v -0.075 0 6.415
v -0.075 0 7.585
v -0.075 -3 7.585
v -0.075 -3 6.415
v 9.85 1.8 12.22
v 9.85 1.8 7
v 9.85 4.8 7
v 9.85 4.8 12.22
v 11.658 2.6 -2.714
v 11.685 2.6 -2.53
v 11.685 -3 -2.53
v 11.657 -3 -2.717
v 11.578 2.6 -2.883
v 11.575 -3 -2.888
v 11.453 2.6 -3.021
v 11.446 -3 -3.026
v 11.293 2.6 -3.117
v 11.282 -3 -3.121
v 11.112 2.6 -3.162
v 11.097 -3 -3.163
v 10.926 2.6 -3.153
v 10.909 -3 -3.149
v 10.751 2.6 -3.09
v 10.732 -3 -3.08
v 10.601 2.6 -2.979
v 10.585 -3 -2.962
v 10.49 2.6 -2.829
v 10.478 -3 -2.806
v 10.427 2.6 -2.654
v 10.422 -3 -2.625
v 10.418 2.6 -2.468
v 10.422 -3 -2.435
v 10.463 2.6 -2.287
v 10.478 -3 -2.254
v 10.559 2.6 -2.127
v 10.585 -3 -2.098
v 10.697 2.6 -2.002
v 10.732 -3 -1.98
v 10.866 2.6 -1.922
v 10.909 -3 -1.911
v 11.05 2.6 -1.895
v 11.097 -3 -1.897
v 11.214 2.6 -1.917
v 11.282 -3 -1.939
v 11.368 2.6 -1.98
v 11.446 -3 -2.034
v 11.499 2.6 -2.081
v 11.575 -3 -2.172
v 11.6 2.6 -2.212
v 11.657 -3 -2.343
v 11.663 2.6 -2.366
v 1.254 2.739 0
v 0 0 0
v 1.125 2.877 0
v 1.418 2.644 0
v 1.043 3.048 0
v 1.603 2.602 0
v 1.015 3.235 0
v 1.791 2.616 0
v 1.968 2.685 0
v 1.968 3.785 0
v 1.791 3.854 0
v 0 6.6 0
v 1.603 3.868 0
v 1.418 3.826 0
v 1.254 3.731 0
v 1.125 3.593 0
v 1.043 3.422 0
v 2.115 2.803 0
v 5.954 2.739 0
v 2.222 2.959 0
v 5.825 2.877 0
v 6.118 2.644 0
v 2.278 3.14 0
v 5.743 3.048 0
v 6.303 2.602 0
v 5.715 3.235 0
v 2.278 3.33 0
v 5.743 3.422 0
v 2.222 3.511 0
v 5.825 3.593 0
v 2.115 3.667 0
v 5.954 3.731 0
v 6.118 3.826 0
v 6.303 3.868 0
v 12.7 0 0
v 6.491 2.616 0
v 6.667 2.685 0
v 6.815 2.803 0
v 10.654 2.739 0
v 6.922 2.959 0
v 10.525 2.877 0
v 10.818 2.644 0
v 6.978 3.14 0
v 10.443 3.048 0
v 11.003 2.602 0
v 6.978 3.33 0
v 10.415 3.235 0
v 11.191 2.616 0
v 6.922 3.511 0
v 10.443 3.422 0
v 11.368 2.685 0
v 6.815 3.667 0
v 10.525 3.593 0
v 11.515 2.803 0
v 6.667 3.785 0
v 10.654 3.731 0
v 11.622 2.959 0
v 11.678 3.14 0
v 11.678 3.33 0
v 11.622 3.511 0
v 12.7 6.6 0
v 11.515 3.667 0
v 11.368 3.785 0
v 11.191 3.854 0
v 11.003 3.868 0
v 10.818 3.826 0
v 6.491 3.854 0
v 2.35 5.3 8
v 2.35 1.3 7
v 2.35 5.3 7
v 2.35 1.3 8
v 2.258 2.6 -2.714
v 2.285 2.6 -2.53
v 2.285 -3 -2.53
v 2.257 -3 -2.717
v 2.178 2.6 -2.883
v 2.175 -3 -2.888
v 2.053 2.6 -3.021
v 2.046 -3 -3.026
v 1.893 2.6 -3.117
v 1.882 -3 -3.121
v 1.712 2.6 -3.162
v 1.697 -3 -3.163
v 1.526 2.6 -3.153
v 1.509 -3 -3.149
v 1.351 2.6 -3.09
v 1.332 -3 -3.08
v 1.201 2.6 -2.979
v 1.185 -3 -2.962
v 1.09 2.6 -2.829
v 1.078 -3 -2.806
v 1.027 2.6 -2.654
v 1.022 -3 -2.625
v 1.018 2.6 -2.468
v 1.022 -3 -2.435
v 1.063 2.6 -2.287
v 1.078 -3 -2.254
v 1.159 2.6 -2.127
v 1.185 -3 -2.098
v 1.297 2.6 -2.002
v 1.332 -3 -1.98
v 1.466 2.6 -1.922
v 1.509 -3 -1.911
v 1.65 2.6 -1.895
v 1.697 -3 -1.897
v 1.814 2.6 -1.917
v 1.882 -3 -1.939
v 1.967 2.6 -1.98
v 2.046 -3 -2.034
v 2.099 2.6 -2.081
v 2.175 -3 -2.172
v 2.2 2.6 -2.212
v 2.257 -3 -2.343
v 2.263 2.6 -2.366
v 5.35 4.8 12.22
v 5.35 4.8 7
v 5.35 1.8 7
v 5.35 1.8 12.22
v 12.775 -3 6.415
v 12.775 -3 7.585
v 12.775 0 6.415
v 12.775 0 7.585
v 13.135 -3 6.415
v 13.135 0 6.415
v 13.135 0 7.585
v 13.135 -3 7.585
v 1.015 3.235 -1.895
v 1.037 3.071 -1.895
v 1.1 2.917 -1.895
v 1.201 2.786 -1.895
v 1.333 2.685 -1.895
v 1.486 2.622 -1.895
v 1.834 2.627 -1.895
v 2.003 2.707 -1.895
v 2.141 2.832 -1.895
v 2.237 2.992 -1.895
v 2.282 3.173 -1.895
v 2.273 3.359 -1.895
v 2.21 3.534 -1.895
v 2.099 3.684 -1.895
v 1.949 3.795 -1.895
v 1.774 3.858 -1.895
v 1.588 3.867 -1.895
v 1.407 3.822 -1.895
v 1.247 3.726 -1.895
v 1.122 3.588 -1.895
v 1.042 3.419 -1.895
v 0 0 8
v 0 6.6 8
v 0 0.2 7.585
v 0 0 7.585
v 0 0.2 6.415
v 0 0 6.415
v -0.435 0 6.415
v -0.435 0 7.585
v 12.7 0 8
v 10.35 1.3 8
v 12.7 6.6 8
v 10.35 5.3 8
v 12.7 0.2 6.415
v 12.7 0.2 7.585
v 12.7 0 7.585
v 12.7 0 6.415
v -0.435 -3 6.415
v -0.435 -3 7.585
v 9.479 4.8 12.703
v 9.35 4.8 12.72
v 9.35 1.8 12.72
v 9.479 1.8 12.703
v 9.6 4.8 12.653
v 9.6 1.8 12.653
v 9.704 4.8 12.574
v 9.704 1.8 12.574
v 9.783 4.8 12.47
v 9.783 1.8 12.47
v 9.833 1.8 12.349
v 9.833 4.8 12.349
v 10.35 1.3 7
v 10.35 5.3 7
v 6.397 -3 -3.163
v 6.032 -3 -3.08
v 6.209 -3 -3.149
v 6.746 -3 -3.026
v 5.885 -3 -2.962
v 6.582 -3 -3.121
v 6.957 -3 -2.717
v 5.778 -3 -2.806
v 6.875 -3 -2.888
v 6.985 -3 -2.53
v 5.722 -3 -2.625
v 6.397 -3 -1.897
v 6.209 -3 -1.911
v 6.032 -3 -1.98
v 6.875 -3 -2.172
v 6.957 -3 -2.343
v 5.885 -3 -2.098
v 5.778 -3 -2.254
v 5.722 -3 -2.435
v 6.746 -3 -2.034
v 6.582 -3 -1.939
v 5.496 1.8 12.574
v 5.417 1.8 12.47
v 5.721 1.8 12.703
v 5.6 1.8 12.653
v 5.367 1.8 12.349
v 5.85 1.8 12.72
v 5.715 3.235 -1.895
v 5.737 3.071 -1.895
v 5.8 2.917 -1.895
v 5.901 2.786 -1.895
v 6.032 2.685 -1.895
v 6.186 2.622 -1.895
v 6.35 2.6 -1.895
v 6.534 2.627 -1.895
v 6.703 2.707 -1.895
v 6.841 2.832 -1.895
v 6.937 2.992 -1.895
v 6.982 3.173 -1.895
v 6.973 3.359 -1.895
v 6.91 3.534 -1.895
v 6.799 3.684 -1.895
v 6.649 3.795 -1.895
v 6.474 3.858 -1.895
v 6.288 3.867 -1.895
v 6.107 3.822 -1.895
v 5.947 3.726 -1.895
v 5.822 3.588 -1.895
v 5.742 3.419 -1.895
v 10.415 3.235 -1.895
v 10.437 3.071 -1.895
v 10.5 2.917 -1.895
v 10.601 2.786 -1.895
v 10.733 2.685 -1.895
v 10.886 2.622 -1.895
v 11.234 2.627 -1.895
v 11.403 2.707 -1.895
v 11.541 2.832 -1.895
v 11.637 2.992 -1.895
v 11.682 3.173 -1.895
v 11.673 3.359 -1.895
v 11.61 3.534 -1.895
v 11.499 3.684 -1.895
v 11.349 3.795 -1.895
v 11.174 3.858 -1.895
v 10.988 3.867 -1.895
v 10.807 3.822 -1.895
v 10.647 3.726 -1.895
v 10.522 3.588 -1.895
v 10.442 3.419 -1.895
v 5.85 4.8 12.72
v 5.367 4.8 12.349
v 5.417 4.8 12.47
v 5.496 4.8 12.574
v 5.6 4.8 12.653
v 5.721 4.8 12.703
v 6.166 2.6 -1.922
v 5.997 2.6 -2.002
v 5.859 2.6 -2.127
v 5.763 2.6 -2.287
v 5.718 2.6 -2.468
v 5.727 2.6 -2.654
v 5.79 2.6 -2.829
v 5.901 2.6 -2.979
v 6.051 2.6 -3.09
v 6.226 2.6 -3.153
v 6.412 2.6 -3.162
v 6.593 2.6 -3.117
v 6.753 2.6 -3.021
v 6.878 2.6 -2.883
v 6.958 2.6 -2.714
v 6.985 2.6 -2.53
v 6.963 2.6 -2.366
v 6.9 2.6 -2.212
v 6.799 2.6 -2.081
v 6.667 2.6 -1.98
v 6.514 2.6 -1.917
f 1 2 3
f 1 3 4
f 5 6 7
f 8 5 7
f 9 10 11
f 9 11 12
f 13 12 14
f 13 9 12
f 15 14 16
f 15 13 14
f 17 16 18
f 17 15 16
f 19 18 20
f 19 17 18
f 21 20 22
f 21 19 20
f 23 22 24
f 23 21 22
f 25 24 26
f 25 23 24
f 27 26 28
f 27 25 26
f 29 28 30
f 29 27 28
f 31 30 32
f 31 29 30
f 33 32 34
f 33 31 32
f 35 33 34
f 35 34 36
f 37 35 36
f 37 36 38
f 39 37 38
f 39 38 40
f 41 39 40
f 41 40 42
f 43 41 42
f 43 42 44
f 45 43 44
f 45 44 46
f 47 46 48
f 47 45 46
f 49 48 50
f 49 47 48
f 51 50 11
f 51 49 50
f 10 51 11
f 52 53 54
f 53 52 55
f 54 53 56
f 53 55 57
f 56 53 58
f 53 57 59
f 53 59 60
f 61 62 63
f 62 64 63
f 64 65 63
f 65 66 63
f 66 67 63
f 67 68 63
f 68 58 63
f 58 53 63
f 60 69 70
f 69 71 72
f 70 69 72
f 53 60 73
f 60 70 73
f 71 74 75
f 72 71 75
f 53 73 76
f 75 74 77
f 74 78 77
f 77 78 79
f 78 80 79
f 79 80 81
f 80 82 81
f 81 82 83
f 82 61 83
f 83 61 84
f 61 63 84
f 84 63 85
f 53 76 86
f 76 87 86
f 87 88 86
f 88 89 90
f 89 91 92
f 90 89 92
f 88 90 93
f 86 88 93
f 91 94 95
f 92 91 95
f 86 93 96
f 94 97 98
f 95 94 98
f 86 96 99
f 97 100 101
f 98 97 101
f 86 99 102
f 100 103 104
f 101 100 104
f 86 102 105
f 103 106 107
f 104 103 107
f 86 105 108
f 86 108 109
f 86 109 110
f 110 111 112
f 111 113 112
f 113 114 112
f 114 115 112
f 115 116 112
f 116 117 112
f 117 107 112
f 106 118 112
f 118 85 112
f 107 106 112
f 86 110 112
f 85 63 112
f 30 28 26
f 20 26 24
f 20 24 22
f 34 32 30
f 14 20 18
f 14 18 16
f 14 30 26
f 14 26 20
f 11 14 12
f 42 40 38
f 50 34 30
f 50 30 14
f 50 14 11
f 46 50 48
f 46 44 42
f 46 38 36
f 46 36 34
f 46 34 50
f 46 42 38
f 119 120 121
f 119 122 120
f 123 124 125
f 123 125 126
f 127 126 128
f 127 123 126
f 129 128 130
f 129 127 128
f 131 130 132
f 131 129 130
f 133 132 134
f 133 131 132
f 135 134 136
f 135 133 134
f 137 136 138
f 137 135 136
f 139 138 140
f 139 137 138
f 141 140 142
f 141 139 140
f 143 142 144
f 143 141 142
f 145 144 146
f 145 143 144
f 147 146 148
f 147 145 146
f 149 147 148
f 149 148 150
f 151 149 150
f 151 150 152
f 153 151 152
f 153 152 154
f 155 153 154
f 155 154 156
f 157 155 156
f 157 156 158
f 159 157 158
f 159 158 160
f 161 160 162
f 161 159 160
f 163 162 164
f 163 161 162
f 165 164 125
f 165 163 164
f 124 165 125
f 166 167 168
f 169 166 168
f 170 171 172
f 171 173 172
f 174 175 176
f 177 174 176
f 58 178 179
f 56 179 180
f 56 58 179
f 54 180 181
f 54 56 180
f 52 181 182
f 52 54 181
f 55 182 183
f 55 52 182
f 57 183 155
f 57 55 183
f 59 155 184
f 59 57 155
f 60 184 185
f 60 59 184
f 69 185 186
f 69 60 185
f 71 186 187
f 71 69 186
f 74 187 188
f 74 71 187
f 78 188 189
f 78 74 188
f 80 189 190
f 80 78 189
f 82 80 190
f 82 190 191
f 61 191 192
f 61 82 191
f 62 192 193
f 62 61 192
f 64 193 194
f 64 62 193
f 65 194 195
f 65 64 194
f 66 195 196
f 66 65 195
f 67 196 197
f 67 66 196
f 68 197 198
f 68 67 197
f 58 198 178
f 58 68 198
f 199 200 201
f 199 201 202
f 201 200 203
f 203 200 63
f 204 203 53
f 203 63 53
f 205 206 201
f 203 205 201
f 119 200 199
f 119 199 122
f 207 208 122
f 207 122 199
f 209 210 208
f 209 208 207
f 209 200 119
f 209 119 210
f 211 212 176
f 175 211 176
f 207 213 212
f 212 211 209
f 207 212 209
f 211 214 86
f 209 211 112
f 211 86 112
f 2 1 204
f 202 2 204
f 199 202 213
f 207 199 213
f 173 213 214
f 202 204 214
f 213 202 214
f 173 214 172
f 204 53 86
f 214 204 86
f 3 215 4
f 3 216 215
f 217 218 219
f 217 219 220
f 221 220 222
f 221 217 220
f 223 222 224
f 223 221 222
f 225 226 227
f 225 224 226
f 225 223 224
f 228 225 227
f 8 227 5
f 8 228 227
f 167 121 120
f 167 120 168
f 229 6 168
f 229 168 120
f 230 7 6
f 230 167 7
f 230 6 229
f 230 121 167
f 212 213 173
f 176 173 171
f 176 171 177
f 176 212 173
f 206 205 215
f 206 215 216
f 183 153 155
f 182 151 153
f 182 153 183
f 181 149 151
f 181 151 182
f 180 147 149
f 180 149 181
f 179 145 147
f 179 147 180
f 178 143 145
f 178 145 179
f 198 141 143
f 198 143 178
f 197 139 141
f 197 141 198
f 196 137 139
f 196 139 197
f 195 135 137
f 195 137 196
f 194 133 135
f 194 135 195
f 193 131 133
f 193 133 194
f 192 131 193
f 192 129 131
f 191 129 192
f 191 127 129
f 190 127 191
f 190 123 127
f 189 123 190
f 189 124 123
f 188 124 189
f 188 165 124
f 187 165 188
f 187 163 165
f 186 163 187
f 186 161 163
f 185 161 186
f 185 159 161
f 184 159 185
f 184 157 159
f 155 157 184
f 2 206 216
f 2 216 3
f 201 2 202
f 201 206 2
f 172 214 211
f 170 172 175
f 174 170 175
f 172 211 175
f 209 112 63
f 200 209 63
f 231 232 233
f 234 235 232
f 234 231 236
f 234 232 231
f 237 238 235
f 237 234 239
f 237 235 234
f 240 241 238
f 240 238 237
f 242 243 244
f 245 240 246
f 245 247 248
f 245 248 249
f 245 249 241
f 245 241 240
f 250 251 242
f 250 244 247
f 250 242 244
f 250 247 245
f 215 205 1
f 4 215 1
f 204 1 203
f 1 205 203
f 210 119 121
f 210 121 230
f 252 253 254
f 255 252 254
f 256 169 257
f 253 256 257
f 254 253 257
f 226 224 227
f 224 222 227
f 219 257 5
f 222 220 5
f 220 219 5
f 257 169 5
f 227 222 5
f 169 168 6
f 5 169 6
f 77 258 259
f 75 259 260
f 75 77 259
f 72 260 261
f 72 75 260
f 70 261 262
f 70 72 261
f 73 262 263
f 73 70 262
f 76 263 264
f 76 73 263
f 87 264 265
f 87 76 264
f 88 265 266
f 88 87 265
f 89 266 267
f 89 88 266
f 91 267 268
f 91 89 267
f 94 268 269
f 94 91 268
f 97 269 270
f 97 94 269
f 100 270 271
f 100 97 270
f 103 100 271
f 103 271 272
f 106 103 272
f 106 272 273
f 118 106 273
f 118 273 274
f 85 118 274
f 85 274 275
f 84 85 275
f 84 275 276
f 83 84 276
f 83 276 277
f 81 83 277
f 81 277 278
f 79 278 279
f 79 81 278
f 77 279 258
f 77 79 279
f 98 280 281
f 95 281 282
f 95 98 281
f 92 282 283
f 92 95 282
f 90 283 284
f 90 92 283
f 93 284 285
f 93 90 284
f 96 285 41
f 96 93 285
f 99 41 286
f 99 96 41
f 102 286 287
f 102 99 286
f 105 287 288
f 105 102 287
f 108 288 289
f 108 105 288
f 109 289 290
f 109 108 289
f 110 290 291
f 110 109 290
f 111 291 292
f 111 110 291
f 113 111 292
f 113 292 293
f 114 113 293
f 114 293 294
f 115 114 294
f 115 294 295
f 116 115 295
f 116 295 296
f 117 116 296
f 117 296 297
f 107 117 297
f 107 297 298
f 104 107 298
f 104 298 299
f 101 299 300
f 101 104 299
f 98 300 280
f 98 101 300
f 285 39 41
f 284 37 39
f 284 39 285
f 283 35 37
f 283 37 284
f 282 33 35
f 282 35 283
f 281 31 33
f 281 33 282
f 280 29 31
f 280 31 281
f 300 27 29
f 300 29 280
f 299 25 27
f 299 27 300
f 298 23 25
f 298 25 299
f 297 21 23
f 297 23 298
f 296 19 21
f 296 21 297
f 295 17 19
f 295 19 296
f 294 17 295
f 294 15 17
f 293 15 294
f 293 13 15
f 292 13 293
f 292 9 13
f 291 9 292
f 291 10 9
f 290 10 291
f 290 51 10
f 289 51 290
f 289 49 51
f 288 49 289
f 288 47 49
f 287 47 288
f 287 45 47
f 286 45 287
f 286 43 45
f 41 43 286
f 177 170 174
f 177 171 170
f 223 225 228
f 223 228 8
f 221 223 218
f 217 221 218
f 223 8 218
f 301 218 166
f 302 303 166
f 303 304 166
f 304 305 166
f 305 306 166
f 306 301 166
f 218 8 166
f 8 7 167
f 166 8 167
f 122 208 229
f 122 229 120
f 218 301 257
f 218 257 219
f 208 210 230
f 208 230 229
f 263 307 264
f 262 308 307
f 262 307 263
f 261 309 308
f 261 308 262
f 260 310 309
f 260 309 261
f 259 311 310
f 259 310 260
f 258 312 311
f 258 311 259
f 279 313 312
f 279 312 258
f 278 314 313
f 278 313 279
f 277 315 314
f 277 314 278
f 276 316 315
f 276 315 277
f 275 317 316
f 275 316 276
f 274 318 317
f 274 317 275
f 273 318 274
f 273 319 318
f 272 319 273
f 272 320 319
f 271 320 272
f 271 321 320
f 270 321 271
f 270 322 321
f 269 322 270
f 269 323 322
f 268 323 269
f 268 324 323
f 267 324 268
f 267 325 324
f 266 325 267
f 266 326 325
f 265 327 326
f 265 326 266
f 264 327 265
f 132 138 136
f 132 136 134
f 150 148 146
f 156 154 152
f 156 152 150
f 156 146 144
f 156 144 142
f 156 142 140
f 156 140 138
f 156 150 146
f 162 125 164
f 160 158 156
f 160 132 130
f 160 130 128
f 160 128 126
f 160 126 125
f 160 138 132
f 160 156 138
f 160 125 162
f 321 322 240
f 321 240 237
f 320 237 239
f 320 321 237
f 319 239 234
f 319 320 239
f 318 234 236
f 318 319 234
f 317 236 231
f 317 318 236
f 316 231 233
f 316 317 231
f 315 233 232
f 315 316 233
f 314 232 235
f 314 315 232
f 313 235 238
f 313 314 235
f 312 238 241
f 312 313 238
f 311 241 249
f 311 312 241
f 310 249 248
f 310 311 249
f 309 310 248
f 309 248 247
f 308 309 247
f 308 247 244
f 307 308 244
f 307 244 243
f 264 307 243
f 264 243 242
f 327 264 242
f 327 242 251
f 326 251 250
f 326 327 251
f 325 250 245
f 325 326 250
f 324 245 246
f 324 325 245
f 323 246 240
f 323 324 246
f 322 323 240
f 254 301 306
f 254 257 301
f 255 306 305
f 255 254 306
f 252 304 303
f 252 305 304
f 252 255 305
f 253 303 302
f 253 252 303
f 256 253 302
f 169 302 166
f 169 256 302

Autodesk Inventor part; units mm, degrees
ref_plane "YZ Plane" through (0, 0, 0) normal (1, 0, 0) x (0, 1, 0)
sketch "Sketch1" plane through (0, 0, 0) normal (0, 0, 1) x (1, 0, 0)
  line L0 (0, 0) -> (12.7, 0)
  line L1 (12.7, 0) -> (12.7, 6.6)
  line L2 (12.7, 6.6) -> (0, 6.6)
  line L3 (0, 6.6) -> (0, 0)
  dimension "d0" = 12.7
  dimension "d1" = 6.6
extrude "Extrusion1" add sketch "Sketch1" along normal blind 8
sketch "Sketch2" plane through (0, 0, 0) normal (0, -1, 0) x (1, 0, 0)
  line L0 (0, 0) -> (12.7, 0) construction
  line L1 (12.7, 0) -> (12.7, 8) construction
  line L2 (0, 8) -> (12.7, 8) construction
  line L3 (0, 0) -> (0, 8) construction
  line L4 (0, 0) -> (12.7, 0) construction
  line L5 (6.35, 0) -> (6.35, 8) construction
  line L6 (0, 8) -> (12.7, 8) construction
  line L7 (13.135, 7.585) -> (12.775, 7.585)
  line L8 (12.775, 7.585) -> (12.775, 6.415)
  line L9 (12.775, 6.415) -> (13.135, 6.415)
  line L10 (13.135, 6.415) -> (13.135, 7.585)
  line L11 (13.135, 7.585) -> (12.775, 6.415) construction
  line L12 (12.775, 7.585) -> (13.135, 6.415) construction
  circle A0 centre (6.35, -2.53) radius 0.635
  circle A1 centre (11.05, -2.53) radius 0.635
  circle A2 centre (1.65, -2.53) radius 0.635
  line L13 (11.05, -2.53) -> (6.35, -2.53) construction
  line L14 (6.35, -2.53) -> (1.65, -2.53) construction
  line L15 (-0.435, 7.585) -> (-0.075, 7.585)
  line L16 (-0.075, 7.585) -> (-0.075, 6.415)
  line L17 (-0.075, 6.415) -> (-0.435, 6.415)
  line L18 (-0.435, 6.415) -> (-0.435, 7.585)
  point P0 (12.955, 7)
  dimension "d4" = 1.17
  dimension "d5" = 0.36
  dimension "d6" = 6.605
  dimension "d7" = 1.27
  dimension "d8" = 1.27
  dimension "d9" = 1.27
  dimension "d10" = 9.53
  dimension "d11" = 4.7
  dimension "d12" = 4.7
  dimension "d13" = 1
extrude "Extrusion2" add sketch "Sketch2" along normal blind 3
ref_plane "Work Plane1" through (0, 2.6, 0) normal (0, 1, 0) x (1, 0, 0)
sketch "Sketch3" plane through (11.05, 0, -2.53) normal (0, 1, 0) x (1, 0, 0)
  circle A0 centre (0, 0) radius 0.635 projected
  circle A1 centre (-4.7, 0) radius 0.635 projected
  circle A2 centre (-9.4, 0) radius 0.635 projected
  point P0 (-11.05, -2.53)
extrude "Extrusion3" add sketch "Sketch3" along normal up to surface (2.6 mm away)
sketch "Sketch4" plane through (0, 0, 0) normal (0, 0, -1) x (-1, 0, 0)
  line L0 (-6.985, 2.6) -> (-5.715, 2.6) projected
  line L1 (-6.35, 2.6) -> (-6.35, 3.235) construction
  circle A0 centre (-6.35, 3.235) radius 0.635
  point P0 (0, 0)
  dimension "d19" = 0.635
extrude "Extrusion4" add sketch "Sketch4" along normal blind 1.895
sketch "Sketch5" plane through (0, 0, -1.895) normal (0, 0, -1) x (-1, 0, 0)
  arc A0 (-5.715, 3.235) -> (-6.35, 2.6) centre (-6.35, 3.235) ccw construction
  arc A1 (-5.715, 3.235) -> (-6.35, 2.6) centre (-6.35, 3.235) ccw projected
  arc A2 (-6.35, 2.6) -> (-5.715, 3.235) centre (-6.35, 3.235) ccw projected
  point P0 (0, 0)
ref_plane "Work Plane2" through (6.35, 3.235, -1.895) normal (1, 0, 0) x (0, 0, -1)
sketch "Sketch6" plane through (6.35, 3.235, -1.895) normal (1, 0, 0) x (0, 0, -1)
  line L0 (0.635, -0.635) -> (0, -0.635) construction
  line L1 (0, -0.635) -> (0.635, -0.635) construction
  line L2 (0, -0.635) -> (0, 0) construction
  arc A0 (0.635, -0.635) -> (0, 0) centre (0, -0.635) ccw
  point P0 (-1.895, -3.235)
sweep "Sweep1" add profiles "Sketch5" path "Sketch6"
pattern_linear "Rectangular Pattern1" count 3 spacing 4.7 along (-1, 0, 0) of "Sweep1", "Extrusion4" first direction both ways yes
sketch "Sketch7" plane through (-0.435, 0, 7.585) normal (0, 0, 1) x (1, 0, 0)
  line L0 (0.36, 0) -> (0, 0) projected
  line L1 (0.435, 0) -> (13.135, 0) projected
  line L2 (13.135, 0) -> (13.135, 6.6) projected
  line L3 (13.135, 6.6) -> (0.435, 6.6) projected
  line L4 (0.435, 6.6) -> (0.435, 0) projected
  line L5 (0.36, 0) -> (0.36, -3) projected
  line L6 (0.36, 0) -> (0.435, 0)
  line L7 (0, 0) -> (0.435, 0.2)
  line L8 (0.435, 6.6) -> (0.435, 0) projected
  dimension "d27" = 0.2
extrude "Extrusion5" add sketch "Sketch7" against normal up to surface (1.17 mm away) contours L0 L7 L4 L6
mirror "Mirror1" about plane through (6.35, 3.235, -1.895) normal (1, 0, 0) of "Extrusion5"
ref_plane "Work Plane3" through (0, 3.3, 0) normal (0, -1, 0) x (1, 0, 0)
sketch "Sketch9" plane through (0, 0, 8) normal (0, 0, 1) x (1, 0, 0)
  line L0 (15.849, 3.3) -> (-3.149, 3.3) projected
  line L1 (2.35, 5.3) -> (10.35, 5.3)
  line L2 (10.35, 5.3) -> (10.35, 1.3)
  line L3 (10.35, 1.3) -> (2.35, 1.3)
  line L4 (2.35, 1.3) -> (2.35, 5.3)
  line L5 (0, 0) -> (12.7, 0) construction
  line L6 (12.7, 0) -> (12.7, 6.6) construction
  line L7 (12.7, 6.6) -> (0, 6.6) construction
  line L8 (0, 6.6) -> (0, 0) construction
  line L9 (12.7, 6.6) -> (0, 6.6) construction
  line L10 (6.35, 6.6) -> (6.35, 0) construction
  line L11 (0, 0) -> (12.7, 0) construction
  dimension "d30" = 8
  dimension "d31" = 4
extrude "Extrusion6" cut sketch "Sketch9" against normal blind 1
sketch "Sketch10" plane through (0, 0, 7) normal (0, 0, 1) x (1, 0, 0)
  line L0 (2.35, 5.3) -> (10.35, 5.3) projected
  line L1 (2.35, 1.3) -> (2.35, 5.3) projected
  line L2 (10.35, 1.3) -> (2.35, 1.3) projected
  line L3 (10.35, 5.3) -> (10.35, 1.3) projected
  line L4 (9.85, 4.8) -> (5.35, 4.8)
  line L5 (5.35, 4.8) -> (5.35, 1.8)
  line L6 (5.35, 1.8) -> (9.85, 1.8)
  line L7 (9.85, 1.8) -> (9.85, 4.8)
  line L8 (15.849, 3.3) -> (-3.149, 3.3) construction
  point P0 (0, 0)
  dimension "d34" = 4.5
  dimension "d35" = 0.5
  dimension "d36" = 0.5
extrude "Extrusion7" add sketch "Sketch10" along normal blind 5.72 contours L7 L6 L5 L4
fillet "Fillet1" radius 0.5 2 edges at (9.85, 3.3, 12.72) (5.35, 3.3, 12.72)
equation "\"d8\" = d7"
equation "\"d9\" = d7"
equation "\"d12\" = d11"
equation "\"d36\" = d35"
properties part number "5MS1S102AM6QE"
